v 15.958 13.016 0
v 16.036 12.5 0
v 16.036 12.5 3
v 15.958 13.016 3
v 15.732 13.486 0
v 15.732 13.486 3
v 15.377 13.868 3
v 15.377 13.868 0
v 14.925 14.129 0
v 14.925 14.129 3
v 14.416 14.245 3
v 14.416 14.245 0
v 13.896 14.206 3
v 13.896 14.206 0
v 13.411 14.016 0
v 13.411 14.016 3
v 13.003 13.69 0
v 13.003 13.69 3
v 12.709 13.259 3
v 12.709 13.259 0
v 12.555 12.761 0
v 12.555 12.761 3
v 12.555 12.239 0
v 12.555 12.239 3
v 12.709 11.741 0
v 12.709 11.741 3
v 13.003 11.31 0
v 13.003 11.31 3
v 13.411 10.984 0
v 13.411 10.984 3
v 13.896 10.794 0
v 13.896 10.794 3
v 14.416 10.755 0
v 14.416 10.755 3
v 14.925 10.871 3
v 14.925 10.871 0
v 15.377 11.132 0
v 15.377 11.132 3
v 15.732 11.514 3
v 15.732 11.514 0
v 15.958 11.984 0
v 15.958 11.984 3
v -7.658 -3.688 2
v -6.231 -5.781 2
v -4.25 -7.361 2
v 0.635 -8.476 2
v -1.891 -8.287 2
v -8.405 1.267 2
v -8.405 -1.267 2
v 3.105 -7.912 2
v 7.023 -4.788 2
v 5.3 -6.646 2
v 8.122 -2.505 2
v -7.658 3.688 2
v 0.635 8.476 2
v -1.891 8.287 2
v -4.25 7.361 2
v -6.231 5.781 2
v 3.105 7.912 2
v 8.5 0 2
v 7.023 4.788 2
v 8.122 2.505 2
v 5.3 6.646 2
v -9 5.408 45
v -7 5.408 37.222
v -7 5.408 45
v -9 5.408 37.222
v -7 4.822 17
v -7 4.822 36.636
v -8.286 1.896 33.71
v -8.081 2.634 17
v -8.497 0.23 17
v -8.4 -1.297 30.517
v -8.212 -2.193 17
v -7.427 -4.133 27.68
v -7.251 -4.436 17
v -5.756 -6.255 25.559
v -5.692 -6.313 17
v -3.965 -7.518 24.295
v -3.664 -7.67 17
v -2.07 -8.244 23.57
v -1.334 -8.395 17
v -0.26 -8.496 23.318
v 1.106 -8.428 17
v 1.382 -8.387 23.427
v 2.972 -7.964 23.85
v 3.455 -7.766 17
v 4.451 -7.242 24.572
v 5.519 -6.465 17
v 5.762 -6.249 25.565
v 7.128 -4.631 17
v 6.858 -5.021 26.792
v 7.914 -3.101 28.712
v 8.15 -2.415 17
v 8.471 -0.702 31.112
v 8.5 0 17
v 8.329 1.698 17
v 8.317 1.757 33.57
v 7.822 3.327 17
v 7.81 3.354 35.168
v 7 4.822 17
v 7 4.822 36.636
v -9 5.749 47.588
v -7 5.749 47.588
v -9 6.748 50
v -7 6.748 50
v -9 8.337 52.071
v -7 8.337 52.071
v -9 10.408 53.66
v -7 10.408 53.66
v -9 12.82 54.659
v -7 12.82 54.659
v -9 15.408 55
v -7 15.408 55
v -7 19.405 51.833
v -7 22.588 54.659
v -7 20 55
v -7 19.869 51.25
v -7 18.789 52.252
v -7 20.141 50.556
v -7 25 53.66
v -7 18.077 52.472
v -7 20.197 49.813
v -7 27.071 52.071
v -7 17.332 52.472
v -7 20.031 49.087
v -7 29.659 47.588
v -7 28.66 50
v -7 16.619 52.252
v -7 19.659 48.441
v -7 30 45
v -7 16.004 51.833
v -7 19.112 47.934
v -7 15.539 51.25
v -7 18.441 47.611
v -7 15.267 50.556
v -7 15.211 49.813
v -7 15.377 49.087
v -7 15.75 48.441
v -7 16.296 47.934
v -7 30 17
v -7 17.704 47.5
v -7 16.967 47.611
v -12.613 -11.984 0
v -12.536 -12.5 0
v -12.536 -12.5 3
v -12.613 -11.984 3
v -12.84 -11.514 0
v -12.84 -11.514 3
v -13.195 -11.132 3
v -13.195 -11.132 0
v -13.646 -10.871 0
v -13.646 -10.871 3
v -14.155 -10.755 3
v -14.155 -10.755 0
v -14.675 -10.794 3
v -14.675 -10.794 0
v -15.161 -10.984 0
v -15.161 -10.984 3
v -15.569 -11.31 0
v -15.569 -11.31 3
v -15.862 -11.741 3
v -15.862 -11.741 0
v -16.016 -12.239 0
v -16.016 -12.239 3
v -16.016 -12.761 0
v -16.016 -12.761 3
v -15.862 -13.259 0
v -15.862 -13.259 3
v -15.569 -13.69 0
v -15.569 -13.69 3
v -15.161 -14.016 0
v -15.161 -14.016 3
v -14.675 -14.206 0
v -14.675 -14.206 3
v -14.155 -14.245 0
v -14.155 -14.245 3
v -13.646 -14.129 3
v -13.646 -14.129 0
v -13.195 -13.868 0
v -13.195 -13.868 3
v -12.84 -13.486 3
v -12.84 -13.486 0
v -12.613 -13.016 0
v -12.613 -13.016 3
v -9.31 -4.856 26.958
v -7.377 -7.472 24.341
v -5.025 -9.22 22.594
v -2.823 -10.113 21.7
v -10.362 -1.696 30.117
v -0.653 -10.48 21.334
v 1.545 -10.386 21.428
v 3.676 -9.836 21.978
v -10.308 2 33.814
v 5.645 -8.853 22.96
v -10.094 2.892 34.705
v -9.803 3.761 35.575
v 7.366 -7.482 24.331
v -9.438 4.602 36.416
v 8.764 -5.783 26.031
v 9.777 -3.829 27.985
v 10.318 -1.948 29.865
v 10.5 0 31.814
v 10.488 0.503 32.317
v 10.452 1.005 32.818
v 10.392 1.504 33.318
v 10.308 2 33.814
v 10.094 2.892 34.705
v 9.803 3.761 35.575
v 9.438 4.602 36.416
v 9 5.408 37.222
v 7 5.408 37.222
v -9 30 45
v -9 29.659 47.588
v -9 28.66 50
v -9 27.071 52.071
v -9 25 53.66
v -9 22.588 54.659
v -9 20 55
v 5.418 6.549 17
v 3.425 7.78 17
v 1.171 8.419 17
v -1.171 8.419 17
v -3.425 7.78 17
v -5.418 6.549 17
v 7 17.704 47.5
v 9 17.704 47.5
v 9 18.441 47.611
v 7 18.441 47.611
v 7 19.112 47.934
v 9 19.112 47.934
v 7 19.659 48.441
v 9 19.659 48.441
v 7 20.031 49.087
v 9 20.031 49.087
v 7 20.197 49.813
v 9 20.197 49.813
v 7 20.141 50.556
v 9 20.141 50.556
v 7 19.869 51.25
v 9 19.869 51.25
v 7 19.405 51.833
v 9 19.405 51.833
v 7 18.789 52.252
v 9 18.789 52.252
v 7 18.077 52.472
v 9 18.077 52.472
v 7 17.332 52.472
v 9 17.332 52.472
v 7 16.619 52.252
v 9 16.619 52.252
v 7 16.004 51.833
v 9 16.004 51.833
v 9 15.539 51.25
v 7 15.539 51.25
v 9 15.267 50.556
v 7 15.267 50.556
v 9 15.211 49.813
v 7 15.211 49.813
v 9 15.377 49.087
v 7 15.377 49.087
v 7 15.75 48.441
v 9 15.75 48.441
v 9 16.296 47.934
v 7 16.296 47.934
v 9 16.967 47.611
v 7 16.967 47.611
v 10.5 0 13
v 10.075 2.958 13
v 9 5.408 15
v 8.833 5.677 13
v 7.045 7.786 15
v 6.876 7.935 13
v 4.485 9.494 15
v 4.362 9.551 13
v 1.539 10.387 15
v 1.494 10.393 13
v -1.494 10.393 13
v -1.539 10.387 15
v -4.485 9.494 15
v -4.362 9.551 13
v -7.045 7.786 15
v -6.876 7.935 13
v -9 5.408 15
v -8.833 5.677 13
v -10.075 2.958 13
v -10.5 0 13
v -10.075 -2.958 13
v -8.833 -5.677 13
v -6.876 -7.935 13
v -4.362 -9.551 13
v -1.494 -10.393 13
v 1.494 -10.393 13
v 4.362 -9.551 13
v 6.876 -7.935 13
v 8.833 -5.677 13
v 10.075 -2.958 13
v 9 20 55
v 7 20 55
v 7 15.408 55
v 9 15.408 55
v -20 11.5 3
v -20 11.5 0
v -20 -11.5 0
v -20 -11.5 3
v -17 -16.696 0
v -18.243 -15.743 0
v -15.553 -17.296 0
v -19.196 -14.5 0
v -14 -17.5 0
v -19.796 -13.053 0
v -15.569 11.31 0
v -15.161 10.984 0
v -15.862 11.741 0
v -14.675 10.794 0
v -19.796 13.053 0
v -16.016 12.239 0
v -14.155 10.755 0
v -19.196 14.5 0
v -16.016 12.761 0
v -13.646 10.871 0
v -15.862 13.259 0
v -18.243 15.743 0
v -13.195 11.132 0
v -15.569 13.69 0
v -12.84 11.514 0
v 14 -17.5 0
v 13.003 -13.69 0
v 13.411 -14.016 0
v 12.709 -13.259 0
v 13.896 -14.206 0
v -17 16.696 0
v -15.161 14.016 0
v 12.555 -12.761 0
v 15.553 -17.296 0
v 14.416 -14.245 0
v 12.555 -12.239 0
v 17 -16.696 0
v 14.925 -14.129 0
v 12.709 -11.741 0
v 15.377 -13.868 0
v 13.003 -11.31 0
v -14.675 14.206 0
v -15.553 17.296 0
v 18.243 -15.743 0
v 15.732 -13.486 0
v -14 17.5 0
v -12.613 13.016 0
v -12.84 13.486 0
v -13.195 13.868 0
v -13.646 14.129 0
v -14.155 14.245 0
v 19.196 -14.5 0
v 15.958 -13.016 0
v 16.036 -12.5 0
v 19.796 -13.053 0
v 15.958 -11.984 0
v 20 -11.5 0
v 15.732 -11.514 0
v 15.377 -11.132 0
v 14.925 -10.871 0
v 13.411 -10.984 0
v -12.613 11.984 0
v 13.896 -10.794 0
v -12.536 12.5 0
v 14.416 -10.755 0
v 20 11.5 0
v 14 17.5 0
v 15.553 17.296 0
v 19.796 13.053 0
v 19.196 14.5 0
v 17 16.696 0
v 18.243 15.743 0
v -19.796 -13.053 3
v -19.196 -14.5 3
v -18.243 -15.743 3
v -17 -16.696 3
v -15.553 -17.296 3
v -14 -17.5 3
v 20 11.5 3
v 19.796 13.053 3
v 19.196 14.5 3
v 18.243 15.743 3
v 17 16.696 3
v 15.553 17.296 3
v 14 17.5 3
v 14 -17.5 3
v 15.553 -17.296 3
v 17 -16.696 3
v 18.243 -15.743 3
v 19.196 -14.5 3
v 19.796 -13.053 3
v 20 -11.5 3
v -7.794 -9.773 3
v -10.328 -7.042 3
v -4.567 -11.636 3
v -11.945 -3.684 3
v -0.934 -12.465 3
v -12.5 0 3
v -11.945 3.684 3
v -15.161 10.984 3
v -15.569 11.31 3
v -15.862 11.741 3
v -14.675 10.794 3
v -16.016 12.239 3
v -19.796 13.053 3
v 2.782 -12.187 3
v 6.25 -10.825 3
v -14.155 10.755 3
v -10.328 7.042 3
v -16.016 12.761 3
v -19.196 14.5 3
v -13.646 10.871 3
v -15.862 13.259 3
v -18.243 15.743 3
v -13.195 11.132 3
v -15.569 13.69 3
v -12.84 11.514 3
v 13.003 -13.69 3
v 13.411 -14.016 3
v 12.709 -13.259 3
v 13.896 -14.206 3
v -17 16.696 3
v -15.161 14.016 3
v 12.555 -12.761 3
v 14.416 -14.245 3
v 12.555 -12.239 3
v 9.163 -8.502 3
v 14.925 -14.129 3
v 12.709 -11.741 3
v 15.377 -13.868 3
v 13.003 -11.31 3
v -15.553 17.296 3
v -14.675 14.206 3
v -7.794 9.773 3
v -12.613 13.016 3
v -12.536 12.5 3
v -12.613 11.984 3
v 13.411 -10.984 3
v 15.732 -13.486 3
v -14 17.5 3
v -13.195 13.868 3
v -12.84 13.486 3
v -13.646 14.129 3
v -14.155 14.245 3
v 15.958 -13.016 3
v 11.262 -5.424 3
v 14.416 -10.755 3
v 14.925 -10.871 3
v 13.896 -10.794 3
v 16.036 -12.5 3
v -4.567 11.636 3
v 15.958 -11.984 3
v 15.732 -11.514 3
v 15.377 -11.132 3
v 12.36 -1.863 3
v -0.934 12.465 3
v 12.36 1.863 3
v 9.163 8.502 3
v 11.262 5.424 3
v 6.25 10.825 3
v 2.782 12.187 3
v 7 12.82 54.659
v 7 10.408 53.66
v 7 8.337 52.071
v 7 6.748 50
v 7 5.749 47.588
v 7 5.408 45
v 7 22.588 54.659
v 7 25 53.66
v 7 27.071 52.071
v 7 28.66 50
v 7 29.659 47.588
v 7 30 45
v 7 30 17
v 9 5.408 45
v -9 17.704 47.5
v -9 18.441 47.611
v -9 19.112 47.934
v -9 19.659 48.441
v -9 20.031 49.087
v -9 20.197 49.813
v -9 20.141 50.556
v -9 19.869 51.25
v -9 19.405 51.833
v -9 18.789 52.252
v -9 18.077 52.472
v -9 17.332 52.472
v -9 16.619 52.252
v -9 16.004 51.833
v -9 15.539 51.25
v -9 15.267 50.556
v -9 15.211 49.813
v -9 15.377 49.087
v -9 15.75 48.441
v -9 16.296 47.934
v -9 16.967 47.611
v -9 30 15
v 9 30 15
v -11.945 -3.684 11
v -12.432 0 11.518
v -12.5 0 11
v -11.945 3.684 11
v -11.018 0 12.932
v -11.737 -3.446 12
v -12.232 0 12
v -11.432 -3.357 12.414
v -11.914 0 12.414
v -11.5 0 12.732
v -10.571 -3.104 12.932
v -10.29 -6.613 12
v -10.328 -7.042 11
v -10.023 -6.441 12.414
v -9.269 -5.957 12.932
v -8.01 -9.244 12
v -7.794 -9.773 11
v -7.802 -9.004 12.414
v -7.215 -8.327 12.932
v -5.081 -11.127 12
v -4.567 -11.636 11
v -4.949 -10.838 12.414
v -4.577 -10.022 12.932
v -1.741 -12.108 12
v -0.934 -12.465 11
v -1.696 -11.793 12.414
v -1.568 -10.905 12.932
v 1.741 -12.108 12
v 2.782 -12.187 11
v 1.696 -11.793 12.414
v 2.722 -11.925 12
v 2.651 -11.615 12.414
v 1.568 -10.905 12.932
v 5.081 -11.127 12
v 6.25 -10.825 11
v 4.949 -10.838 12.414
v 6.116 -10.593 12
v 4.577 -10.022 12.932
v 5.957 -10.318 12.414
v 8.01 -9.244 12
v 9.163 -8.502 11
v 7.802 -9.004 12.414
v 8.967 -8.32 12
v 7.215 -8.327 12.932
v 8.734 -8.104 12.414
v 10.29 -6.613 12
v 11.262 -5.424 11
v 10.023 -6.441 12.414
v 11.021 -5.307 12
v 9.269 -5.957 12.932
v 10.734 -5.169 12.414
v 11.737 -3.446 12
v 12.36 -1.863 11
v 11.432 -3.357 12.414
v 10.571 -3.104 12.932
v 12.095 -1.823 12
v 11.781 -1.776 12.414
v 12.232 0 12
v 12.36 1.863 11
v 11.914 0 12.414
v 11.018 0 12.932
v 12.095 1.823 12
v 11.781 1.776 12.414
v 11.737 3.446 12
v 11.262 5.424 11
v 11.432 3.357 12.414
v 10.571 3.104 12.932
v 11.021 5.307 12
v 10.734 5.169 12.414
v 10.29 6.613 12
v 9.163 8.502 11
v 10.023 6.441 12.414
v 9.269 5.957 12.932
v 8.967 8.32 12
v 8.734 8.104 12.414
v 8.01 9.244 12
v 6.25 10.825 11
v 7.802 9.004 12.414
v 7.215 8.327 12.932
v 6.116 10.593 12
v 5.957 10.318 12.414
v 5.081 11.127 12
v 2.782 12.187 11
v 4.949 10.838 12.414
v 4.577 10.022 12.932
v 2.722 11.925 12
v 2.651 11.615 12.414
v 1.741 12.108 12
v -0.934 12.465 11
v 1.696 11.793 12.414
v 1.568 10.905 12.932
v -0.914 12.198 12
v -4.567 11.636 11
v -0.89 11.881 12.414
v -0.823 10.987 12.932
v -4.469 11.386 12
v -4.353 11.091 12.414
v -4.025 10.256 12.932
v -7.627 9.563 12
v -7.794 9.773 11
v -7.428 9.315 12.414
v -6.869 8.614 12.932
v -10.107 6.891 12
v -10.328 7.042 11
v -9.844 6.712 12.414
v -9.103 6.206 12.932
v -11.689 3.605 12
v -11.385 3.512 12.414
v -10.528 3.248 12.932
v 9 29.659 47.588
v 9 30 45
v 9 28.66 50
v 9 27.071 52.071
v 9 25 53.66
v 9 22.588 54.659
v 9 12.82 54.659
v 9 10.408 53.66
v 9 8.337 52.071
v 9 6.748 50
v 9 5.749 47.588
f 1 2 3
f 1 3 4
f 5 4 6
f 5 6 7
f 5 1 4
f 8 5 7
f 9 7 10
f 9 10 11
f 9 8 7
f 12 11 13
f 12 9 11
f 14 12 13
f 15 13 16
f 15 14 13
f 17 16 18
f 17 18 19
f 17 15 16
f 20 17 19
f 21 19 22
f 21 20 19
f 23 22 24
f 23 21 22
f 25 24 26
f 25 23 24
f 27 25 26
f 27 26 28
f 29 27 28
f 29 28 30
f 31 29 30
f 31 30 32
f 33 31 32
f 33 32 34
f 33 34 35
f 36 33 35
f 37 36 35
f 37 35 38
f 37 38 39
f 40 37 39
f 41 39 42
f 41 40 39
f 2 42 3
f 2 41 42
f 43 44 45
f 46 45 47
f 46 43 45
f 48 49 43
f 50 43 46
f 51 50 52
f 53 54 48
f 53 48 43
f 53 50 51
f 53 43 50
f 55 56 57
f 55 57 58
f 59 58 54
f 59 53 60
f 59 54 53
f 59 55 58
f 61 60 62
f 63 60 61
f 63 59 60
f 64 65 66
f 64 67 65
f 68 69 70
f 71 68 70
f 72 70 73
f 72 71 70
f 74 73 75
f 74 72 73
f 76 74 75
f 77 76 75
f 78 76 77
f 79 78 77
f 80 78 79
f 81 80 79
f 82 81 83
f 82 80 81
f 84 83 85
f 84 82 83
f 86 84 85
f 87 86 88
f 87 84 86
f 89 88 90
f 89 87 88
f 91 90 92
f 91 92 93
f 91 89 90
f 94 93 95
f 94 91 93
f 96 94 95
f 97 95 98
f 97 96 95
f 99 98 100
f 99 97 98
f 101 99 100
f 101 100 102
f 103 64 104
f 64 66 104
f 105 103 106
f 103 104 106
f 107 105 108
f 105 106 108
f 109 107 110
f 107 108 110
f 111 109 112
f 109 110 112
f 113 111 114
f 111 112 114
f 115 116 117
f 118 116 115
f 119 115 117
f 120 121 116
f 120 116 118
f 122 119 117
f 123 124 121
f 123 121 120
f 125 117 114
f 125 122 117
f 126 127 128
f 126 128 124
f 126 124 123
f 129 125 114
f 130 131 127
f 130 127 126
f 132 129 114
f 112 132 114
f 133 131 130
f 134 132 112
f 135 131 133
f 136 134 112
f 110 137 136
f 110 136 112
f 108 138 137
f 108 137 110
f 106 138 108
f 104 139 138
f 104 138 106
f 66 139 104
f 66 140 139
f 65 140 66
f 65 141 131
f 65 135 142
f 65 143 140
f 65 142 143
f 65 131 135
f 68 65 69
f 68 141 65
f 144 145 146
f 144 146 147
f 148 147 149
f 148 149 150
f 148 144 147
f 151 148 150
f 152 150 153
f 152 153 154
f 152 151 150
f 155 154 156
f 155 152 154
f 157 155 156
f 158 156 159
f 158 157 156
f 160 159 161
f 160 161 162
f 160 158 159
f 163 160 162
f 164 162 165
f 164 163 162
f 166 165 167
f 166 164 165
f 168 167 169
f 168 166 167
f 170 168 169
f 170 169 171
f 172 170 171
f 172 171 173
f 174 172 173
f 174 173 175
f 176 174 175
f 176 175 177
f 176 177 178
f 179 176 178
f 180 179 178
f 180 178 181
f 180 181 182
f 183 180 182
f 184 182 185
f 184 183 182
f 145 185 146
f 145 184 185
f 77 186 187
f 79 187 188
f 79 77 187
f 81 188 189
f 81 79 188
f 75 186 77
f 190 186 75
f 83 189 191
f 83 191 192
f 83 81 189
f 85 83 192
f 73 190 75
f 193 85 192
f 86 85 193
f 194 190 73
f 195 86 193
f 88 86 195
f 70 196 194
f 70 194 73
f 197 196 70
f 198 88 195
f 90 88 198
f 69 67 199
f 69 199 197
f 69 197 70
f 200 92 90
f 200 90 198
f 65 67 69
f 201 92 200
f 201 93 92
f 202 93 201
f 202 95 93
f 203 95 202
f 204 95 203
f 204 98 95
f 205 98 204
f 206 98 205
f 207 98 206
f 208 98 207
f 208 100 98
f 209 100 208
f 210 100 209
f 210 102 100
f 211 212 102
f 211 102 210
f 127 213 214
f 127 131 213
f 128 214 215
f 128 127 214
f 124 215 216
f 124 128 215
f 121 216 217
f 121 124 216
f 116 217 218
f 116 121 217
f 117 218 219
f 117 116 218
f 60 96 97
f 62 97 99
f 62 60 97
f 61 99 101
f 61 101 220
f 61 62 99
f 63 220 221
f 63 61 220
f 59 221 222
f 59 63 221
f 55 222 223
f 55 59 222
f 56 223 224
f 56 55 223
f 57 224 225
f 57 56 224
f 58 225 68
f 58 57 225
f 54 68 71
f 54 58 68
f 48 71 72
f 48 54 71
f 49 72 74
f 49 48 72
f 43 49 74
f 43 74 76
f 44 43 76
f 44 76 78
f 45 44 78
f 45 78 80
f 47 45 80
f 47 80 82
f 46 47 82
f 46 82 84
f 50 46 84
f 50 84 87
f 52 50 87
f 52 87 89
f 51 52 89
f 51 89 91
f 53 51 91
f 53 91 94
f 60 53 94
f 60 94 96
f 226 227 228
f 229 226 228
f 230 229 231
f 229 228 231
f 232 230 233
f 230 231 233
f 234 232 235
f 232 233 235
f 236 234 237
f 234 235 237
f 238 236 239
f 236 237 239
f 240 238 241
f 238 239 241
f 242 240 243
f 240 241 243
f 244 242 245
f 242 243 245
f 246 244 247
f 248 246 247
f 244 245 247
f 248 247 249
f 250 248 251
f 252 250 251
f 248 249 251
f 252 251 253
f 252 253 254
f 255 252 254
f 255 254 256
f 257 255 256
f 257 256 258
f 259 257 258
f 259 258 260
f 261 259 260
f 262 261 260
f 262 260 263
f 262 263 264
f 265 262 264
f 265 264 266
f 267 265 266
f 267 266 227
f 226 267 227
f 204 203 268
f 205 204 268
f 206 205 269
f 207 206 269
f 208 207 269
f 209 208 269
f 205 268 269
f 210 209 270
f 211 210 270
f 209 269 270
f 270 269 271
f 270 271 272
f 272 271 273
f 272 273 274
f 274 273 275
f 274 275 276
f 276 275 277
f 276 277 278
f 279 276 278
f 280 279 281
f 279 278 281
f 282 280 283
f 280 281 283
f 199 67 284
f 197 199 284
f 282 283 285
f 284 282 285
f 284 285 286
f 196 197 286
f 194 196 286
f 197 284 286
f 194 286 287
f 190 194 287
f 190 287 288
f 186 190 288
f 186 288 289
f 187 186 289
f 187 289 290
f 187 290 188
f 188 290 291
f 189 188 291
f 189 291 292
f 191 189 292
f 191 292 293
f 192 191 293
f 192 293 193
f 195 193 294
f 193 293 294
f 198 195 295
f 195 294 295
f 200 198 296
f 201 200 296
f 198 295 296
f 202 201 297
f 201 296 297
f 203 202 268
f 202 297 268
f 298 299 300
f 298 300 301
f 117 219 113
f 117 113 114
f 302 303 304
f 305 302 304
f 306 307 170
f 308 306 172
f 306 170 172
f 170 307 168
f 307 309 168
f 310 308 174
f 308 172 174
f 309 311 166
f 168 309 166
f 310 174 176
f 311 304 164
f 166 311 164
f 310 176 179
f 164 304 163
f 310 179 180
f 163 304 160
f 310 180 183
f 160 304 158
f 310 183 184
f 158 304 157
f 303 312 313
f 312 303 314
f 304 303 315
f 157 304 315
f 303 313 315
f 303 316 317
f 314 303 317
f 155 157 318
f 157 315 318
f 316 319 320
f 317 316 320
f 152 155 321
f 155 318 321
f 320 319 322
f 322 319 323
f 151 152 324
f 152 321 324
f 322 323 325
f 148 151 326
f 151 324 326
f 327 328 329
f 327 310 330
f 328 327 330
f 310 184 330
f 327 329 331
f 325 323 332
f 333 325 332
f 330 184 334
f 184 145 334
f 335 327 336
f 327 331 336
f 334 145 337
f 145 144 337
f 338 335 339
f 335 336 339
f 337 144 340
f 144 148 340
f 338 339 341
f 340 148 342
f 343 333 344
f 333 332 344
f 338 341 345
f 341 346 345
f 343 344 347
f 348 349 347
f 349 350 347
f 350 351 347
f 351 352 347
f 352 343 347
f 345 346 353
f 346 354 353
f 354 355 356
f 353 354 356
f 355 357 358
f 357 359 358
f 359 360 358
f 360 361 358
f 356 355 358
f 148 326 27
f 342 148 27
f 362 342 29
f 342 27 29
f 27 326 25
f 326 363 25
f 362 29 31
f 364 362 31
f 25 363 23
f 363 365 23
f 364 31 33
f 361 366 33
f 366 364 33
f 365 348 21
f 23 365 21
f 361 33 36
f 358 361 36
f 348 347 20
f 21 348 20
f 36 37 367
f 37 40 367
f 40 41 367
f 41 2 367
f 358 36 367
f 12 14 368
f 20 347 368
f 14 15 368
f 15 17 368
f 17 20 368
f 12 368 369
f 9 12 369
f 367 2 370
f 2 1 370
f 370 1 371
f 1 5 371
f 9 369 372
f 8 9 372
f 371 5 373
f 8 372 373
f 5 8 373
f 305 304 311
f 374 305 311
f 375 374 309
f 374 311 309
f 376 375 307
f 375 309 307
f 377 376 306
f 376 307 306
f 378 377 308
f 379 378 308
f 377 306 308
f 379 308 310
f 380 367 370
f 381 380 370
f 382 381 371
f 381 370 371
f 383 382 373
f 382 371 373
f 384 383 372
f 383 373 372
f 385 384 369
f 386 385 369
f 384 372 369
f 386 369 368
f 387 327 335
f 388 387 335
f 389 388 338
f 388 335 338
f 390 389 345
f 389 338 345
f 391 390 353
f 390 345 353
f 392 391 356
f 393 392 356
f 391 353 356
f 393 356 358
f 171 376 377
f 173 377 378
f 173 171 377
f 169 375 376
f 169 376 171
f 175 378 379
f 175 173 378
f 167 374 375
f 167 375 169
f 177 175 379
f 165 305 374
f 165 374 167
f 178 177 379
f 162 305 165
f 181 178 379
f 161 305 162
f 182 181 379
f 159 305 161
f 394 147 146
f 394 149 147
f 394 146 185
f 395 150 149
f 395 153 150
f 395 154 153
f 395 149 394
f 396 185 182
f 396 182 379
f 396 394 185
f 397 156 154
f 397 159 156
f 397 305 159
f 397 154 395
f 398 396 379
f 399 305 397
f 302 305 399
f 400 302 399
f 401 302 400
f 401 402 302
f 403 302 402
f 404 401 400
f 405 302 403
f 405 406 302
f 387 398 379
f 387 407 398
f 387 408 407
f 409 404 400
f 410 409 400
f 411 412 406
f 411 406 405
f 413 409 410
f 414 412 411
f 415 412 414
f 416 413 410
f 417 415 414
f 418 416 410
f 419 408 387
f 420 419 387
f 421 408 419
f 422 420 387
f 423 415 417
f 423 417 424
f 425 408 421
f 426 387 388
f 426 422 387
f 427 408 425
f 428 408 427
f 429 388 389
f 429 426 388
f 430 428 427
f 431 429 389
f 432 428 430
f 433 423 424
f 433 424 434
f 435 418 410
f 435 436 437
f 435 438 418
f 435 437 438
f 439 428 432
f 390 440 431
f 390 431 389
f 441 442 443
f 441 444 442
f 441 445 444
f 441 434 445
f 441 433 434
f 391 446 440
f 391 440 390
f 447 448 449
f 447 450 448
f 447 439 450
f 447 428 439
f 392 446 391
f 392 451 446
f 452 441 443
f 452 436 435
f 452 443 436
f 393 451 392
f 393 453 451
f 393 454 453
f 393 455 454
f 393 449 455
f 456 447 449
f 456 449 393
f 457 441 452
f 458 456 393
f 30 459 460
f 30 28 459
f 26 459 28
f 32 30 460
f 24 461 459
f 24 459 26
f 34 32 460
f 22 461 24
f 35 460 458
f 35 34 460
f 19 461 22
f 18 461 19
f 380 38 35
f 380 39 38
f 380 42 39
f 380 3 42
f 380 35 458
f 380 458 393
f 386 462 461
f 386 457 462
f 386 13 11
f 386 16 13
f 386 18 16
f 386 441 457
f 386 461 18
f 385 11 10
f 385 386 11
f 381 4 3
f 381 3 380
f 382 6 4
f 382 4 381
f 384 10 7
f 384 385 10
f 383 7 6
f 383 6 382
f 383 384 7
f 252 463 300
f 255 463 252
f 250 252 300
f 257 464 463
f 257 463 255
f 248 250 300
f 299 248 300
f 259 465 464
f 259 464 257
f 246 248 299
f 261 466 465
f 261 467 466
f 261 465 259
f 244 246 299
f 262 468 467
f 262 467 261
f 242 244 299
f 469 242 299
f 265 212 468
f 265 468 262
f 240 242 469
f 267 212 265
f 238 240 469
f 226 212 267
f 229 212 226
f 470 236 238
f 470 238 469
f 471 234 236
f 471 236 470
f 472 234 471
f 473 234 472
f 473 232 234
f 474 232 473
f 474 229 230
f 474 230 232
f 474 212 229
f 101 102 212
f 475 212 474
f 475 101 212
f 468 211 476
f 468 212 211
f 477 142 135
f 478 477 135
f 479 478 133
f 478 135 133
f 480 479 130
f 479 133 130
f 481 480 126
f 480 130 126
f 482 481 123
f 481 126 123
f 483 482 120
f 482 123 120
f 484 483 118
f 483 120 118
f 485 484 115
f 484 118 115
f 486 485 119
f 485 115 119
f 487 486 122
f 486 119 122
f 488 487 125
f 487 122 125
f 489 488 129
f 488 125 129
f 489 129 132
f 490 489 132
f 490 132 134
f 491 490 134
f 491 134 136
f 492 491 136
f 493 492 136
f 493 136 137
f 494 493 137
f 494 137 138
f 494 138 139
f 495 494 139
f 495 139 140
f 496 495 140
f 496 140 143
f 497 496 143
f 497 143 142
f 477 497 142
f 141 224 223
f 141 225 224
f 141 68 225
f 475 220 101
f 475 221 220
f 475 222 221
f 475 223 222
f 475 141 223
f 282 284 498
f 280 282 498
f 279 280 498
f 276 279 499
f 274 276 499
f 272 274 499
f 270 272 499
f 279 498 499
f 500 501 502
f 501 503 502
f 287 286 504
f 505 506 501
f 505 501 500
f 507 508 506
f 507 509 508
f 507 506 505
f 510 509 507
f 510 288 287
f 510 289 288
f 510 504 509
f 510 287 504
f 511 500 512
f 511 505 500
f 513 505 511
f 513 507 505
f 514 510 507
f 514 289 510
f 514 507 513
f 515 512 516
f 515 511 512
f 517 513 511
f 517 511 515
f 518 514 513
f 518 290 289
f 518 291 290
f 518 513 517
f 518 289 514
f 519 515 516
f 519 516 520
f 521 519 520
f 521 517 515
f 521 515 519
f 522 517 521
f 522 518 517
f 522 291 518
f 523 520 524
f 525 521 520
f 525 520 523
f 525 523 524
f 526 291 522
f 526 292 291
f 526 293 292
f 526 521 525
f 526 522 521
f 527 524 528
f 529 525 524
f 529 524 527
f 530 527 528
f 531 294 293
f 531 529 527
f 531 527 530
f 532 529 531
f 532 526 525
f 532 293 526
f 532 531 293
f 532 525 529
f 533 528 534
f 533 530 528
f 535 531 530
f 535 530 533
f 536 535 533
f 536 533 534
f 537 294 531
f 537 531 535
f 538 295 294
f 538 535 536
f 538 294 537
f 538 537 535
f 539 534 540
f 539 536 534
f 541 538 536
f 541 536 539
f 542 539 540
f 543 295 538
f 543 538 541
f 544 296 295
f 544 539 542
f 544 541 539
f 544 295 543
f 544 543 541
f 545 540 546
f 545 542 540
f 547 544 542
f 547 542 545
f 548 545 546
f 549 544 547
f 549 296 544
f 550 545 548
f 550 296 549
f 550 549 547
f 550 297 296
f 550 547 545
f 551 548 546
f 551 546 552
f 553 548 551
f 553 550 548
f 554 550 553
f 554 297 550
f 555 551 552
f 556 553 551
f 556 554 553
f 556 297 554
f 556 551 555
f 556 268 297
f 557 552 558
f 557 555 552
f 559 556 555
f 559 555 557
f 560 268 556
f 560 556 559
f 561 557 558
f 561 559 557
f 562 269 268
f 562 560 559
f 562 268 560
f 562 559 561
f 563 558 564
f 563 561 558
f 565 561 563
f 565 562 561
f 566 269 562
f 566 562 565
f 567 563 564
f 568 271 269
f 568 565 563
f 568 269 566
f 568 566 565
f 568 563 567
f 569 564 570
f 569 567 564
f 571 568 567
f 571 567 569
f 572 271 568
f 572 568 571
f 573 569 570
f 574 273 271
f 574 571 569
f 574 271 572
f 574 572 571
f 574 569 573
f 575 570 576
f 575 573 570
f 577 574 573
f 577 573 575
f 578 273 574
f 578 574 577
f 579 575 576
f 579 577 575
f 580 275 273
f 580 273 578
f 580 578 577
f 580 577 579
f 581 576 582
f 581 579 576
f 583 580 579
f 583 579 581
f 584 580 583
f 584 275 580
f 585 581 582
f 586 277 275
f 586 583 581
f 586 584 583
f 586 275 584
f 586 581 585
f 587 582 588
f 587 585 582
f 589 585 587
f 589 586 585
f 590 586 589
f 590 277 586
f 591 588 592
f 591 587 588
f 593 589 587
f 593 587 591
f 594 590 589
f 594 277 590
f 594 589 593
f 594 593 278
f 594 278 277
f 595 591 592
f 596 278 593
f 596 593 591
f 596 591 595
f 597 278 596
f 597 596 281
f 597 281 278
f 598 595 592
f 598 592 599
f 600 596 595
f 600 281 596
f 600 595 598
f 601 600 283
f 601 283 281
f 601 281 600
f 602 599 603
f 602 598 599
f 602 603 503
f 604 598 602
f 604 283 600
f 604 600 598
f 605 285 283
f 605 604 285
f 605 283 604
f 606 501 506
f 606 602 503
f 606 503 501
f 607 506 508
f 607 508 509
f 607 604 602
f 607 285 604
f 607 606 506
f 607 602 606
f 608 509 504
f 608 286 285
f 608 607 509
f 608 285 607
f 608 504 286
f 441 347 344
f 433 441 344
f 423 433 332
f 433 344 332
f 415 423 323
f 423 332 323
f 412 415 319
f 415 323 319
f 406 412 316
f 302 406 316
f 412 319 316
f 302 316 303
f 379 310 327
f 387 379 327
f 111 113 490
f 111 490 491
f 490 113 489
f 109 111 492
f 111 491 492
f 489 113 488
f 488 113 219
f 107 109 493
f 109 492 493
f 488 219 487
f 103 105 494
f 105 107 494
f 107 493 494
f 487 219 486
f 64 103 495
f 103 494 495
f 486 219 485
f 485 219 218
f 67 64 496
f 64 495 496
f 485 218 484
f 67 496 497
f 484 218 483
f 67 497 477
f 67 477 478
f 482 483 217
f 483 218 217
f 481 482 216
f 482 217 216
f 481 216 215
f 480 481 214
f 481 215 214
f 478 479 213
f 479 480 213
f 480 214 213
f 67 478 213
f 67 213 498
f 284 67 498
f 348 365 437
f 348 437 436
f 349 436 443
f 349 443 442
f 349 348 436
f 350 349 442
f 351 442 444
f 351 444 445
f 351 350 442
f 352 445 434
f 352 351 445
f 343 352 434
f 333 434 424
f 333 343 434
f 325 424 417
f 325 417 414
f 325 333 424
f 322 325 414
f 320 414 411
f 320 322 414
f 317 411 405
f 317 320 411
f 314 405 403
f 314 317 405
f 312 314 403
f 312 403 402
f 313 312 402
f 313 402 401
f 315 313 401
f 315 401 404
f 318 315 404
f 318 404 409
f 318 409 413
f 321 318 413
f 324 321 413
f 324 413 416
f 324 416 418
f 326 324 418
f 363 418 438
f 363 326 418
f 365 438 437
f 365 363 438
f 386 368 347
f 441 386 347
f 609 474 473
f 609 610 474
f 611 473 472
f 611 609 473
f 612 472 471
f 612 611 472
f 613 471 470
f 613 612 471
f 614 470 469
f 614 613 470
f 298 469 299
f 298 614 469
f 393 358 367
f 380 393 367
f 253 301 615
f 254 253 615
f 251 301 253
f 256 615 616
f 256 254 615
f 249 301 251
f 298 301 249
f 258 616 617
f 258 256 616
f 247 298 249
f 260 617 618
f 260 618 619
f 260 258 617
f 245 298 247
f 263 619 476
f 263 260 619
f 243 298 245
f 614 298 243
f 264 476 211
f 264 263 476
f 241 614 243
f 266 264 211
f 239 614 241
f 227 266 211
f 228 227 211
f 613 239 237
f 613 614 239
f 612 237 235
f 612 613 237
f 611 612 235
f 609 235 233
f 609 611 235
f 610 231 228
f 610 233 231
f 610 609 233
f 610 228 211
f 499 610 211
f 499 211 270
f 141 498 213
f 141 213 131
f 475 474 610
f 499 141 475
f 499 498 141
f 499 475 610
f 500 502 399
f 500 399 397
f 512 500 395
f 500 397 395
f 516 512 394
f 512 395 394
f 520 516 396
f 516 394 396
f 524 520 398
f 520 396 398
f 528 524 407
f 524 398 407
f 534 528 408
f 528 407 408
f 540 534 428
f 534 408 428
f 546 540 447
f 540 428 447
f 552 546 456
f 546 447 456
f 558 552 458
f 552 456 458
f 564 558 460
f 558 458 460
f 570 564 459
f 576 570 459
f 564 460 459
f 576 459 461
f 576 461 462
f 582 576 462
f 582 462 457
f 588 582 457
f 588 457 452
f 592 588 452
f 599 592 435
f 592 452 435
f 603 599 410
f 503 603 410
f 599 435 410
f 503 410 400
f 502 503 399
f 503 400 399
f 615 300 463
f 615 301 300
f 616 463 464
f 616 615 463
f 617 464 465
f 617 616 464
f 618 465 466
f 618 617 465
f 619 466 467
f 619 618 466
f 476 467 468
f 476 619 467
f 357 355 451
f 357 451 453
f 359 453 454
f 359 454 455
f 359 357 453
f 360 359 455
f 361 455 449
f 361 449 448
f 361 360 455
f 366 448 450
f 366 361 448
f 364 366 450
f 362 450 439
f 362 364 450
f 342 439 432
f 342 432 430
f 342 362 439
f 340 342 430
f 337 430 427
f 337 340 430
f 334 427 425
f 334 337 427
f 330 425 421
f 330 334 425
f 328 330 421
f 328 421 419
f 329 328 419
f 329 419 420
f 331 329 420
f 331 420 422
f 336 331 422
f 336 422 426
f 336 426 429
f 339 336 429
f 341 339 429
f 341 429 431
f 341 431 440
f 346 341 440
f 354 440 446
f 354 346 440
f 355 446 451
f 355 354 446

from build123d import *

# Parameters (mm, degrees)
SKETCH_1_R               = 1.75
EXTRUDE_1_DEPTH          = 3
SKETCH_2_R               = 12.5
EXTRUDE_2_DEPTH          = 10
FILLET_1_R               = 2
SKETCH_5_R               = 10.5
EXTRUDE_4_DEPTH          = 30
SKETCH_7_W               = 18
SKETCH_7_H               = 40
EXTRUDE_5_DEPTH          = 28
CUT_EXTRUDE_1_DEPTH      = 70.036222376
CUT_EXTRUDE_1_DEPTH_BACK = 70.036222376
SHELL_START              = 17
SHELL_1_DEPTH            = 38
SHELL_START_2            = 2
SHELL_1_2_OUTLINE_R      = 8.5
SHELL_1_2_DEPTH          = 15
FILLET_2_R               = 10
SKETCH_9_R               = 2.5
CUT_EXTRUDE_2_DEPTH      = 70.036222376


# Read off the part's stored shape, not the designer's step: 抽壳1
with BuildPart() as part:
    # 草图1 → 凸台-拉伸1 (new body)
    with BuildSketch(Plane.XY):
        with BuildLine():
            Line((-14, -17.5), (14, -17.5))
            ThreePointArc((14, -17.5), (18.242640687, -15.742640687), (20, -11.5))
            Line((20, -11.5), (20, 11.5))
            ThreePointArc((20, 11.5), (18.242640687, 15.742640687), (14, 17.5))
            Line((14, 17.5), (-14, 17.5))
            ThreePointArc((-14, 17.5), (-18.242640687, 15.742640687), (-20, 11.5))
            Line((-20, 11.5), (-20, -11.5))
            ThreePointArc((-20, -11.5), (-18.242640687, -15.742640687), (-14, -17.5))
        make_face()
        with Locations((-14.285714286, 12.5)):
            Circle(SKETCH_1_R, mode=Mode.SUBTRACT)
        with Locations((-14.285714286, -12.5)):
            Circle(SKETCH_1_R, mode=Mode.SUBTRACT)
        with Locations((14.285714286, -12.5)):
            Circle(SKETCH_1_R, mode=Mode.SUBTRACT)
        with Locations((14.285714286, 12.5)):
            Circle(SKETCH_1_R, mode=Mode.SUBTRACT)
    extrude(amount=EXTRUDE_1_DEPTH)

    # 草图2 → 凸台-拉伸2 (add)
    with BuildSketch(Plane.XY.offset(3)):
        with Locations(Location((0, 0, 0), (0, 0, 180))):
            Circle(SKETCH_2_R)
    extrude(amount=EXTRUDE_2_DEPTH)

    # 圆角1
    fillet_1_edges = [part.edges().sort_by_distance(p)[0] for p in [
        (12.5, 0, 13),
    ]]
    fillet(fillet_1_edges, radius=FILLET_1_R)

    # 草图5 → 凸台-拉伸4 (add)
    with BuildSketch(Plane.XY.offset(13)):
        Circle(SKETCH_5_R)
    extrude(amount=EXTRUDE_4_DEPTH)

    # Surface Cut 2
    split(bisect_by=Plane(origin=(0, -15.906854249, 15.906854249), x_dir=(1, 0, 0), z_dir=(0, -0.7071067811865488, 0.7071067811865464)), keep=Keep.BOTTOM)

    # 草图7 → 凸台-拉伸5 (add)
    with BuildSketch(Plane(origin=(0, 30, 0), x_dir=(1, 0, 0), z_dir=(0, 1, 0))):
        with Locations((0, -35)):
            Rectangle(SKETCH_7_W, SKETCH_7_H)
    extrude(amount=-EXTRUDE_5_DEPTH)

    # 草图8 → 切除-拉伸1 (cut, two sides: drawn at the far end of the back side and taken through both)
    with BuildSketch(Plane(origin=(9, 0, 0), x_dir=(0, 0, -1), z_dir=(1, 0, 0)).offset(-CUT_EXTRUDE_1_DEPTH_BACK)):
        Polygon((-37.222035412, 5.408326913), (-55, 5.408326913), (-55, 2), (-33.813708499, 2), align=None)
    extrude(amount=CUT_EXTRUDE_1_DEPTH + CUT_EXTRUDE_1_DEPTH_BACK, mode=Mode.SUBTRACT)

    # 抽壳1 outline → 抽壳1 (cut)
    with BuildSketch(Plane.XY.offset(SHELL_START)):
        with BuildLine():
            Line((7, 30), (-7, 30))
            Line((-7, 30), (-7, 4.82182538))
            ThreePointArc((-7, 4.82182538), (0, -8.5), (7, 4.82182538))
            Line((7, 4.82182538), (7, 30))
        make_face()
    extrude(amount=SHELL_1_DEPTH, mode=Mode.SUBTRACT)

    # Shell 1 2 outline → Shell 1 2 (cut)
    with BuildSketch(Plane.XY.offset(SHELL_START_2)):
        Circle(SHELL_1_2_OUTLINE_R)
    extrude(amount=SHELL_1_2_DEPTH, mode=Mode.SUBTRACT)

    # 圆角2
    fillet_2_edges = [part.edges().sort_by_distance(p)[0] for p in [
        (8, 5.408326913, 55),
        (8, 30, 55),
        (-8, 30, 55),
        (-8, 5.408326913, 55),
    ]]
    fillet(fillet_2_edges, radius=FILLET_2_R)

    # 草图9 → 切除-拉伸2 (cut, through all)
    with BuildSketch(Plane(origin=(9, 0, 0), x_dir=(0, 0, -1), z_dir=(1, 0, 0))):
        with Locations((-50, 17.704163457)):
            Circle(SKETCH_9_R)
    extrude(amount=-CUT_EXTRUDE_2_DEPTH, mode=Mode.SUBTRACT)


solid = part.part
